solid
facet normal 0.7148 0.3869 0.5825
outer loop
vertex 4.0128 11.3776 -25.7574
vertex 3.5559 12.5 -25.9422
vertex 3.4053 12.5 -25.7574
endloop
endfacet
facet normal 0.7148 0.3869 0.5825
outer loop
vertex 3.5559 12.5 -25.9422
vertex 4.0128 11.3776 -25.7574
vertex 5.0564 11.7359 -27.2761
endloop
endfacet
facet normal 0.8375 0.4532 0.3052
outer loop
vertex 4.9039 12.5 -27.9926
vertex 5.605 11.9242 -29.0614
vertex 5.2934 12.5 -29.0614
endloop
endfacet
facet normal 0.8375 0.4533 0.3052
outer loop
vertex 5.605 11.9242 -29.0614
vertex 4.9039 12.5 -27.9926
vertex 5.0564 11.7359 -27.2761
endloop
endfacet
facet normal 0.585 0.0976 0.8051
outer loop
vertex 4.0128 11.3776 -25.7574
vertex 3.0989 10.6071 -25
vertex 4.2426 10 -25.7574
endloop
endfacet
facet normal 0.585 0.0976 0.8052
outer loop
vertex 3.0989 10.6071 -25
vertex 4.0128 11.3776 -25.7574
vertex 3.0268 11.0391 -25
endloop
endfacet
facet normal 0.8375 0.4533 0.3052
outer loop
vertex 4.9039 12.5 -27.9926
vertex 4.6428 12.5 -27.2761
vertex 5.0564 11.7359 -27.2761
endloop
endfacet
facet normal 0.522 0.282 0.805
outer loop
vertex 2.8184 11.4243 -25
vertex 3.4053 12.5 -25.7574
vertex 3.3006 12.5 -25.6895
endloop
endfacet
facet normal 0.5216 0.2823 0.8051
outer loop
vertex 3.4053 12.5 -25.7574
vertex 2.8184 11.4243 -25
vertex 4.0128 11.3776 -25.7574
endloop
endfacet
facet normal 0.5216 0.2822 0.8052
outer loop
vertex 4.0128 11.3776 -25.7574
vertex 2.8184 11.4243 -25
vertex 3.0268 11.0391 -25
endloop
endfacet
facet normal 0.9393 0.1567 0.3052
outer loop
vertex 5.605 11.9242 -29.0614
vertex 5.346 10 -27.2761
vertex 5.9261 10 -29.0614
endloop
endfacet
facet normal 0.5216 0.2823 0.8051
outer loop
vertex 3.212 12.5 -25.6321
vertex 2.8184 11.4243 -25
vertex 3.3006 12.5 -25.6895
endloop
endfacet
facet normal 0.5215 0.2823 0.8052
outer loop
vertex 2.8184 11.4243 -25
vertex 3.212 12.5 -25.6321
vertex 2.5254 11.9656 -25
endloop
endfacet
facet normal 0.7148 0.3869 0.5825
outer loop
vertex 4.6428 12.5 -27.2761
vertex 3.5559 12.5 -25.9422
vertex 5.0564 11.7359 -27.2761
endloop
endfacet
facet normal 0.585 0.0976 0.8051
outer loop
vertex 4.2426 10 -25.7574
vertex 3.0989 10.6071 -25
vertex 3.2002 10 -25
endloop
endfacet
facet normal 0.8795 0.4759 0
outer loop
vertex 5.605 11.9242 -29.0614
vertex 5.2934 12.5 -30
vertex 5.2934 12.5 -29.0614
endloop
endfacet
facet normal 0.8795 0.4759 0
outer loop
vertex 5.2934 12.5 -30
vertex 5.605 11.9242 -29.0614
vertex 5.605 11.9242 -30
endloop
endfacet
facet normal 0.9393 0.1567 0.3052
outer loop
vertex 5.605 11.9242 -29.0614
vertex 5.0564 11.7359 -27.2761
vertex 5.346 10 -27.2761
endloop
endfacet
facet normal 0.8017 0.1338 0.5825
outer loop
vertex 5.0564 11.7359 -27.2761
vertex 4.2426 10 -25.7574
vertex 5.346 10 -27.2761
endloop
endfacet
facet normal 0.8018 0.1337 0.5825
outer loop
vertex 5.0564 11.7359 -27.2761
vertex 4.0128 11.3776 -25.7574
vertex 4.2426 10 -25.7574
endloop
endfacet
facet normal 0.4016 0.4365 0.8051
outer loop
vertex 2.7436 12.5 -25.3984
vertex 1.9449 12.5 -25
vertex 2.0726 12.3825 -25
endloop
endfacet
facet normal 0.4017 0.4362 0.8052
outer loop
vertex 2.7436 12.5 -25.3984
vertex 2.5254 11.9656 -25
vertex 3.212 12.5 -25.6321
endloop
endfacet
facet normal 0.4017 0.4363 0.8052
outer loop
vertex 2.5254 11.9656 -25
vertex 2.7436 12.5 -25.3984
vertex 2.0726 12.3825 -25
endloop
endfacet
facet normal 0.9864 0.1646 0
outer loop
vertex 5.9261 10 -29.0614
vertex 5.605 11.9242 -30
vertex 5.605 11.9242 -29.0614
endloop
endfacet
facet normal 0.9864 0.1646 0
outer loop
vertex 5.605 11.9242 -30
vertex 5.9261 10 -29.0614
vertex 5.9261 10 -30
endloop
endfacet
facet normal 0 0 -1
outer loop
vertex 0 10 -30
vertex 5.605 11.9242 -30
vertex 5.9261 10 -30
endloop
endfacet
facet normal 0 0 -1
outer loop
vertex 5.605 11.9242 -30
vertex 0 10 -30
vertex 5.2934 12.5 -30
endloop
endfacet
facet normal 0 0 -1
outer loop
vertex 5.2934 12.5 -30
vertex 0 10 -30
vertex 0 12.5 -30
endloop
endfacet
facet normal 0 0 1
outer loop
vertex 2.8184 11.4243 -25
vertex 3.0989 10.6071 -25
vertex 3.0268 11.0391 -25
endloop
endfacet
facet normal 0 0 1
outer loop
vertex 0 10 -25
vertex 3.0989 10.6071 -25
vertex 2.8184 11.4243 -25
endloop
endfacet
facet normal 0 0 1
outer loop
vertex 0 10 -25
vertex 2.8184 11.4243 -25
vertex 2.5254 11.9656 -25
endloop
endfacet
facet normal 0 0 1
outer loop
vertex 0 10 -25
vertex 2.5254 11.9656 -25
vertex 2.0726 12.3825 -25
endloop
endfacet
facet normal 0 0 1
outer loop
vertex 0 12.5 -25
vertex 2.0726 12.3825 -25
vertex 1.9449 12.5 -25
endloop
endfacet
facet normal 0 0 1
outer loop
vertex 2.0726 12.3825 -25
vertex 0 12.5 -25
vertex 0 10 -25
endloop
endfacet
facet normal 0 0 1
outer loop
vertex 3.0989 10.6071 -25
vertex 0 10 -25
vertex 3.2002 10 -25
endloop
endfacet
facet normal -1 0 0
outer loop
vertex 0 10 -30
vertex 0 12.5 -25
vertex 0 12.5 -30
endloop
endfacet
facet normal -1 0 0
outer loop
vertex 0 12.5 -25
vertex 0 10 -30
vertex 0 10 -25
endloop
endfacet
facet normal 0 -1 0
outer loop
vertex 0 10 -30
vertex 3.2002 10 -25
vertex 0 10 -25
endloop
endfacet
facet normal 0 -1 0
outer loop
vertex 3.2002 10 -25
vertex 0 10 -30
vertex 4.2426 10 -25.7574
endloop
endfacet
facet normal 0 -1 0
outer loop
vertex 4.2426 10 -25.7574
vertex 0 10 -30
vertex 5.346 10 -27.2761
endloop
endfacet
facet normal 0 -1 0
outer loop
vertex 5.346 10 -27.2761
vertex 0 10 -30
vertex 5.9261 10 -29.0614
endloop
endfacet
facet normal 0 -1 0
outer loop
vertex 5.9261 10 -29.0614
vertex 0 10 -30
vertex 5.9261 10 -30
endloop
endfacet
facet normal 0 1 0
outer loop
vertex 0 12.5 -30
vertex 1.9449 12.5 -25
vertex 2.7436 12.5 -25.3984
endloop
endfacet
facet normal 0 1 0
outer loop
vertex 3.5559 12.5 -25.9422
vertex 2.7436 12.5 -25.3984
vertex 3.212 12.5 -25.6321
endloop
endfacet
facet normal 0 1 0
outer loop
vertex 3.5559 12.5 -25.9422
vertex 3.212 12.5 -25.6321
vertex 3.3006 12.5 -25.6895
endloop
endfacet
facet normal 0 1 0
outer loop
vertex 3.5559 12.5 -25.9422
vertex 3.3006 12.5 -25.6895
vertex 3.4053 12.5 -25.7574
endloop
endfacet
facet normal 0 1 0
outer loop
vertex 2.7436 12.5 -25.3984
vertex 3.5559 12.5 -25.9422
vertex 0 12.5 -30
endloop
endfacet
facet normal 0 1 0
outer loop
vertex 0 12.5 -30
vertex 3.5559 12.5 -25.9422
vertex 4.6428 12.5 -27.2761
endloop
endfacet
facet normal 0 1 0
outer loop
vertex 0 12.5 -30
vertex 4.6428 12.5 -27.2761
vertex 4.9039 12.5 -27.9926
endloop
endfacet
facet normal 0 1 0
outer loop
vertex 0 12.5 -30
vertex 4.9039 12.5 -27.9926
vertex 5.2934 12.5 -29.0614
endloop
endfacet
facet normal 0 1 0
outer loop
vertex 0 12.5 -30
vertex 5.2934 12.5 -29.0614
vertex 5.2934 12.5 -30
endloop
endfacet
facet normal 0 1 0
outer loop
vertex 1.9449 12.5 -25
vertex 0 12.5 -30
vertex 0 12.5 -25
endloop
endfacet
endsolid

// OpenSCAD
// Generated by generate_scads.py
translate([0,10,-30]) {
  intersection() {
    sphere(r=6);
    cylinder(h=10, r=6, center=false);
    cube(size=[25,25,5], center=false);
    cube(size=[30,5,10], center=true);
  }
}
